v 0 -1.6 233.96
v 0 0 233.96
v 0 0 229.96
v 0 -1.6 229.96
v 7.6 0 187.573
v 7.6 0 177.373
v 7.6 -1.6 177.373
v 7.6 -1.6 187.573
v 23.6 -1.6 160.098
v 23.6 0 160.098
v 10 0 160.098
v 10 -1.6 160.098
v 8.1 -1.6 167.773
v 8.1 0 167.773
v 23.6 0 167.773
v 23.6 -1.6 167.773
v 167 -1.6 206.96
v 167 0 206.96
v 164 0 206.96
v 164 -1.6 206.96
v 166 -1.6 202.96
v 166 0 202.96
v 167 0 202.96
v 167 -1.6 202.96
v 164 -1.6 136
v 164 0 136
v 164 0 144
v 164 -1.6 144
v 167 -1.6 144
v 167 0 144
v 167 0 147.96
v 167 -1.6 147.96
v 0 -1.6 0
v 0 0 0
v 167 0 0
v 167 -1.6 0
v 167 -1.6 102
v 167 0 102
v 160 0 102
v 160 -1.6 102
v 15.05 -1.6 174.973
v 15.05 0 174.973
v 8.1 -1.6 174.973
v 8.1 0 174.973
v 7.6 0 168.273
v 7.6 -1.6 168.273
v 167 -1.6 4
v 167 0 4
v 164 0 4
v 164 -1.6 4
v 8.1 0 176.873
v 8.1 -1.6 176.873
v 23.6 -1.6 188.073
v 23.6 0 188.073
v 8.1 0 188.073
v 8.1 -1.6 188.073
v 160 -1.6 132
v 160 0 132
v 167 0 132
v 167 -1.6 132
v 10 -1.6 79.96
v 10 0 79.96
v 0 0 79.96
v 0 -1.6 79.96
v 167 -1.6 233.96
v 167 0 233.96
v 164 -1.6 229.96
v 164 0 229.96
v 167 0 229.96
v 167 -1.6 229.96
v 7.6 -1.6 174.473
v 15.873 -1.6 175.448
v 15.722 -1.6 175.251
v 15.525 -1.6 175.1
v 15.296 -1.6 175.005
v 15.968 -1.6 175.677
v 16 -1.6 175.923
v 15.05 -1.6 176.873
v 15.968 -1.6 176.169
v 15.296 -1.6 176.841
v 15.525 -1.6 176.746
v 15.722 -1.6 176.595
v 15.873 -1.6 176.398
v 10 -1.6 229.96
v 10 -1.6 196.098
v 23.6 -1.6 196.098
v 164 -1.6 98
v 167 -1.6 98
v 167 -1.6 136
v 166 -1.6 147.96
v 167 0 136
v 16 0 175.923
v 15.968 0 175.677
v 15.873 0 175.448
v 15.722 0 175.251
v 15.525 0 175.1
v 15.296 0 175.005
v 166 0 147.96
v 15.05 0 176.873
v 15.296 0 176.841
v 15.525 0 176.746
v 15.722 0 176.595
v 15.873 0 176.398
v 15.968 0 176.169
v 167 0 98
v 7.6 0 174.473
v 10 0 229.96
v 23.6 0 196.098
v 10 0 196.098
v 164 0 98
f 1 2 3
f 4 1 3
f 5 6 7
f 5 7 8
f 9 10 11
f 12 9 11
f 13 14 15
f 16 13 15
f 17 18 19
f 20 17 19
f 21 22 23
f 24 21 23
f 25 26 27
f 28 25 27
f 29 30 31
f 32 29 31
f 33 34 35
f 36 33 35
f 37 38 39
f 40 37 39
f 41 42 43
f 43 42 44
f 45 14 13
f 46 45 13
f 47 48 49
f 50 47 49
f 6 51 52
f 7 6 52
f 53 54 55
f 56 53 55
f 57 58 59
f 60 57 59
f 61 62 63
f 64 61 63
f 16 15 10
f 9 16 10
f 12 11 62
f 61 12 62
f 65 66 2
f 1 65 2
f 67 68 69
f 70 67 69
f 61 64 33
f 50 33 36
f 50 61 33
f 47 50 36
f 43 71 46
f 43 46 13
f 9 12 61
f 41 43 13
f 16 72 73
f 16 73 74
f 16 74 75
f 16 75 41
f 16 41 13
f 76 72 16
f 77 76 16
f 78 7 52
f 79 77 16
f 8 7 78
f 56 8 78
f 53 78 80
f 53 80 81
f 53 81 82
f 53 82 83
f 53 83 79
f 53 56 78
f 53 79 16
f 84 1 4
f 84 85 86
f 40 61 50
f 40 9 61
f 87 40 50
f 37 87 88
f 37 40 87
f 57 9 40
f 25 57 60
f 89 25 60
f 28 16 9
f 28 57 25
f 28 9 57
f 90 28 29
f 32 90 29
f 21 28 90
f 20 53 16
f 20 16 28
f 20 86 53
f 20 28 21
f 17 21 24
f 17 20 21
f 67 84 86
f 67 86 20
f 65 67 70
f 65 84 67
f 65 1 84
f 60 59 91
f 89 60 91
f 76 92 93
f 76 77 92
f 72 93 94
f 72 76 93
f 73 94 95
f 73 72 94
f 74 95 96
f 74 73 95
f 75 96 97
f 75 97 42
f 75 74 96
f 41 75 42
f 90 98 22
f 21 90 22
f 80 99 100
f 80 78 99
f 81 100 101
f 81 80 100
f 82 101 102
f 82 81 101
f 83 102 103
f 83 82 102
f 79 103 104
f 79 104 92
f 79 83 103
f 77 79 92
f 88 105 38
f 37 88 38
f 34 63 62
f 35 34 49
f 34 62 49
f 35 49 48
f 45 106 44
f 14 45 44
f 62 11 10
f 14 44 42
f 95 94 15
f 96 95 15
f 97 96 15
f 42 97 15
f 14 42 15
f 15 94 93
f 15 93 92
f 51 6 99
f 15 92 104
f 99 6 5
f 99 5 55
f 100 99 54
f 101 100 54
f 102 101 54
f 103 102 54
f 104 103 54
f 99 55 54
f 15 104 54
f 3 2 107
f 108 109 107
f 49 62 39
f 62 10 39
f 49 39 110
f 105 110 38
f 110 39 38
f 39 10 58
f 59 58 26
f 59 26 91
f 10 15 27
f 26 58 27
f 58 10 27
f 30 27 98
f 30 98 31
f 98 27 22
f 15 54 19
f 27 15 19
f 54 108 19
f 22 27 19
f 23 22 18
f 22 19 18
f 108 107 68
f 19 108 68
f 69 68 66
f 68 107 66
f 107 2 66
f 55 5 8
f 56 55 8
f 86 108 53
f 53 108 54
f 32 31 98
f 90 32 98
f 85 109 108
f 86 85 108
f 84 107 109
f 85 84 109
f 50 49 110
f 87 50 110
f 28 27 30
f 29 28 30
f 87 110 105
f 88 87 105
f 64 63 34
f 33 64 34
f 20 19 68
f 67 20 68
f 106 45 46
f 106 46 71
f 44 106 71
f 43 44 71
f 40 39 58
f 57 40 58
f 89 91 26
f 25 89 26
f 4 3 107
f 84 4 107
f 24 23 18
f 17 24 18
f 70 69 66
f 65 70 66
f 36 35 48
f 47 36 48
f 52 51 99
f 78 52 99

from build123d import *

# Parameters (mm, degrees)
F0_W     = 10.2457383797
F0_H     = 20.3
F0_W_2   = 2.4
F0_H_2   = 7.2
F0_H_3   = 11.2
F1_DEPTH = 1.6
F2_SIZE  = 0.5
F3_R     = 0.94999


# Not quite as in the source:
# - a fillet or chamfer is up to 0.001 mm smaller than in the source, because OpenCascade refuses the exact size


with BuildPart() as f1:
    # F0 (on Front) → F1 (new body)
    with BuildSketch(Plane.XZ):
        Polygon((0, 79.96), (0, 0), (167, 0), (167, 4), (164, 4), (164, 98), (167, 98), (167, 102), (160, 102), (160, 132), (167, 132), (167, 136), (164, 136), (164, 144), (167, 144), (167, 147.96), (166, 147.96), (166, 202.96), (167, 202.96), (167, 206.96), (164, 206.96), (164, 229.96), (167, 229.96), (167, 233.96), (0, 233.96), (0, 229.96), (10, 229.96), (10, 196.0979268551), (23.6, 196.0979268551), (23.6, 188.0729268551), (33.8457383797, 188.0729268551), (33.8457383797, 167.7729268551), (23.6, 167.7729268551), (23.6, 160.0979268551), (10, 160.0979268551), (10, 79.96), align=None)
        with Locations((28.7228691898, 177.9229268551)):
            Rectangle(F0_W, F0_H)
        Polygon((10, 174.9729268551), (10, 167.7729268551), (23.6, 167.7729268551), (23.6, 188.0729268551), (10, 188.0729268551), (10, 176.8729268551), (16, 176.8729268551), (16, 174.9729268551), align=None)
        with Locations((8.8, 171.3729268551)):
            Rectangle(F0_W_2, F0_H_2)
        with Locations((8.8, 182.4729268551)):
            Rectangle(F0_W_2, F0_H_3)
    extrude(amount=F1_DEPTH)

    # F2
    f2_edges = [f1.edges().sort_by_distance(p)[0] for p in [
        (7.6, -0.8, 167.772927),
        (7.6, -0.8, 174.972927),
        (7.6, -0.8, 176.872927),
        (7.6, -0.8, 188.072927),
    ]]
    chamfer(f2_edges, length=F2_SIZE)

    # F3 (radius 0.95 in the source; OpenCascade refuses exactly that, so slightly less here)
    f3_edges = [f1.edges().sort_by_distance(p)[0] for p in [
        (16, -0.8, 176.872927),
        (16, -0.8, 174.972927),
    ]]
    fillet(f3_edges, radius=F3_R)


solid = f1.part
